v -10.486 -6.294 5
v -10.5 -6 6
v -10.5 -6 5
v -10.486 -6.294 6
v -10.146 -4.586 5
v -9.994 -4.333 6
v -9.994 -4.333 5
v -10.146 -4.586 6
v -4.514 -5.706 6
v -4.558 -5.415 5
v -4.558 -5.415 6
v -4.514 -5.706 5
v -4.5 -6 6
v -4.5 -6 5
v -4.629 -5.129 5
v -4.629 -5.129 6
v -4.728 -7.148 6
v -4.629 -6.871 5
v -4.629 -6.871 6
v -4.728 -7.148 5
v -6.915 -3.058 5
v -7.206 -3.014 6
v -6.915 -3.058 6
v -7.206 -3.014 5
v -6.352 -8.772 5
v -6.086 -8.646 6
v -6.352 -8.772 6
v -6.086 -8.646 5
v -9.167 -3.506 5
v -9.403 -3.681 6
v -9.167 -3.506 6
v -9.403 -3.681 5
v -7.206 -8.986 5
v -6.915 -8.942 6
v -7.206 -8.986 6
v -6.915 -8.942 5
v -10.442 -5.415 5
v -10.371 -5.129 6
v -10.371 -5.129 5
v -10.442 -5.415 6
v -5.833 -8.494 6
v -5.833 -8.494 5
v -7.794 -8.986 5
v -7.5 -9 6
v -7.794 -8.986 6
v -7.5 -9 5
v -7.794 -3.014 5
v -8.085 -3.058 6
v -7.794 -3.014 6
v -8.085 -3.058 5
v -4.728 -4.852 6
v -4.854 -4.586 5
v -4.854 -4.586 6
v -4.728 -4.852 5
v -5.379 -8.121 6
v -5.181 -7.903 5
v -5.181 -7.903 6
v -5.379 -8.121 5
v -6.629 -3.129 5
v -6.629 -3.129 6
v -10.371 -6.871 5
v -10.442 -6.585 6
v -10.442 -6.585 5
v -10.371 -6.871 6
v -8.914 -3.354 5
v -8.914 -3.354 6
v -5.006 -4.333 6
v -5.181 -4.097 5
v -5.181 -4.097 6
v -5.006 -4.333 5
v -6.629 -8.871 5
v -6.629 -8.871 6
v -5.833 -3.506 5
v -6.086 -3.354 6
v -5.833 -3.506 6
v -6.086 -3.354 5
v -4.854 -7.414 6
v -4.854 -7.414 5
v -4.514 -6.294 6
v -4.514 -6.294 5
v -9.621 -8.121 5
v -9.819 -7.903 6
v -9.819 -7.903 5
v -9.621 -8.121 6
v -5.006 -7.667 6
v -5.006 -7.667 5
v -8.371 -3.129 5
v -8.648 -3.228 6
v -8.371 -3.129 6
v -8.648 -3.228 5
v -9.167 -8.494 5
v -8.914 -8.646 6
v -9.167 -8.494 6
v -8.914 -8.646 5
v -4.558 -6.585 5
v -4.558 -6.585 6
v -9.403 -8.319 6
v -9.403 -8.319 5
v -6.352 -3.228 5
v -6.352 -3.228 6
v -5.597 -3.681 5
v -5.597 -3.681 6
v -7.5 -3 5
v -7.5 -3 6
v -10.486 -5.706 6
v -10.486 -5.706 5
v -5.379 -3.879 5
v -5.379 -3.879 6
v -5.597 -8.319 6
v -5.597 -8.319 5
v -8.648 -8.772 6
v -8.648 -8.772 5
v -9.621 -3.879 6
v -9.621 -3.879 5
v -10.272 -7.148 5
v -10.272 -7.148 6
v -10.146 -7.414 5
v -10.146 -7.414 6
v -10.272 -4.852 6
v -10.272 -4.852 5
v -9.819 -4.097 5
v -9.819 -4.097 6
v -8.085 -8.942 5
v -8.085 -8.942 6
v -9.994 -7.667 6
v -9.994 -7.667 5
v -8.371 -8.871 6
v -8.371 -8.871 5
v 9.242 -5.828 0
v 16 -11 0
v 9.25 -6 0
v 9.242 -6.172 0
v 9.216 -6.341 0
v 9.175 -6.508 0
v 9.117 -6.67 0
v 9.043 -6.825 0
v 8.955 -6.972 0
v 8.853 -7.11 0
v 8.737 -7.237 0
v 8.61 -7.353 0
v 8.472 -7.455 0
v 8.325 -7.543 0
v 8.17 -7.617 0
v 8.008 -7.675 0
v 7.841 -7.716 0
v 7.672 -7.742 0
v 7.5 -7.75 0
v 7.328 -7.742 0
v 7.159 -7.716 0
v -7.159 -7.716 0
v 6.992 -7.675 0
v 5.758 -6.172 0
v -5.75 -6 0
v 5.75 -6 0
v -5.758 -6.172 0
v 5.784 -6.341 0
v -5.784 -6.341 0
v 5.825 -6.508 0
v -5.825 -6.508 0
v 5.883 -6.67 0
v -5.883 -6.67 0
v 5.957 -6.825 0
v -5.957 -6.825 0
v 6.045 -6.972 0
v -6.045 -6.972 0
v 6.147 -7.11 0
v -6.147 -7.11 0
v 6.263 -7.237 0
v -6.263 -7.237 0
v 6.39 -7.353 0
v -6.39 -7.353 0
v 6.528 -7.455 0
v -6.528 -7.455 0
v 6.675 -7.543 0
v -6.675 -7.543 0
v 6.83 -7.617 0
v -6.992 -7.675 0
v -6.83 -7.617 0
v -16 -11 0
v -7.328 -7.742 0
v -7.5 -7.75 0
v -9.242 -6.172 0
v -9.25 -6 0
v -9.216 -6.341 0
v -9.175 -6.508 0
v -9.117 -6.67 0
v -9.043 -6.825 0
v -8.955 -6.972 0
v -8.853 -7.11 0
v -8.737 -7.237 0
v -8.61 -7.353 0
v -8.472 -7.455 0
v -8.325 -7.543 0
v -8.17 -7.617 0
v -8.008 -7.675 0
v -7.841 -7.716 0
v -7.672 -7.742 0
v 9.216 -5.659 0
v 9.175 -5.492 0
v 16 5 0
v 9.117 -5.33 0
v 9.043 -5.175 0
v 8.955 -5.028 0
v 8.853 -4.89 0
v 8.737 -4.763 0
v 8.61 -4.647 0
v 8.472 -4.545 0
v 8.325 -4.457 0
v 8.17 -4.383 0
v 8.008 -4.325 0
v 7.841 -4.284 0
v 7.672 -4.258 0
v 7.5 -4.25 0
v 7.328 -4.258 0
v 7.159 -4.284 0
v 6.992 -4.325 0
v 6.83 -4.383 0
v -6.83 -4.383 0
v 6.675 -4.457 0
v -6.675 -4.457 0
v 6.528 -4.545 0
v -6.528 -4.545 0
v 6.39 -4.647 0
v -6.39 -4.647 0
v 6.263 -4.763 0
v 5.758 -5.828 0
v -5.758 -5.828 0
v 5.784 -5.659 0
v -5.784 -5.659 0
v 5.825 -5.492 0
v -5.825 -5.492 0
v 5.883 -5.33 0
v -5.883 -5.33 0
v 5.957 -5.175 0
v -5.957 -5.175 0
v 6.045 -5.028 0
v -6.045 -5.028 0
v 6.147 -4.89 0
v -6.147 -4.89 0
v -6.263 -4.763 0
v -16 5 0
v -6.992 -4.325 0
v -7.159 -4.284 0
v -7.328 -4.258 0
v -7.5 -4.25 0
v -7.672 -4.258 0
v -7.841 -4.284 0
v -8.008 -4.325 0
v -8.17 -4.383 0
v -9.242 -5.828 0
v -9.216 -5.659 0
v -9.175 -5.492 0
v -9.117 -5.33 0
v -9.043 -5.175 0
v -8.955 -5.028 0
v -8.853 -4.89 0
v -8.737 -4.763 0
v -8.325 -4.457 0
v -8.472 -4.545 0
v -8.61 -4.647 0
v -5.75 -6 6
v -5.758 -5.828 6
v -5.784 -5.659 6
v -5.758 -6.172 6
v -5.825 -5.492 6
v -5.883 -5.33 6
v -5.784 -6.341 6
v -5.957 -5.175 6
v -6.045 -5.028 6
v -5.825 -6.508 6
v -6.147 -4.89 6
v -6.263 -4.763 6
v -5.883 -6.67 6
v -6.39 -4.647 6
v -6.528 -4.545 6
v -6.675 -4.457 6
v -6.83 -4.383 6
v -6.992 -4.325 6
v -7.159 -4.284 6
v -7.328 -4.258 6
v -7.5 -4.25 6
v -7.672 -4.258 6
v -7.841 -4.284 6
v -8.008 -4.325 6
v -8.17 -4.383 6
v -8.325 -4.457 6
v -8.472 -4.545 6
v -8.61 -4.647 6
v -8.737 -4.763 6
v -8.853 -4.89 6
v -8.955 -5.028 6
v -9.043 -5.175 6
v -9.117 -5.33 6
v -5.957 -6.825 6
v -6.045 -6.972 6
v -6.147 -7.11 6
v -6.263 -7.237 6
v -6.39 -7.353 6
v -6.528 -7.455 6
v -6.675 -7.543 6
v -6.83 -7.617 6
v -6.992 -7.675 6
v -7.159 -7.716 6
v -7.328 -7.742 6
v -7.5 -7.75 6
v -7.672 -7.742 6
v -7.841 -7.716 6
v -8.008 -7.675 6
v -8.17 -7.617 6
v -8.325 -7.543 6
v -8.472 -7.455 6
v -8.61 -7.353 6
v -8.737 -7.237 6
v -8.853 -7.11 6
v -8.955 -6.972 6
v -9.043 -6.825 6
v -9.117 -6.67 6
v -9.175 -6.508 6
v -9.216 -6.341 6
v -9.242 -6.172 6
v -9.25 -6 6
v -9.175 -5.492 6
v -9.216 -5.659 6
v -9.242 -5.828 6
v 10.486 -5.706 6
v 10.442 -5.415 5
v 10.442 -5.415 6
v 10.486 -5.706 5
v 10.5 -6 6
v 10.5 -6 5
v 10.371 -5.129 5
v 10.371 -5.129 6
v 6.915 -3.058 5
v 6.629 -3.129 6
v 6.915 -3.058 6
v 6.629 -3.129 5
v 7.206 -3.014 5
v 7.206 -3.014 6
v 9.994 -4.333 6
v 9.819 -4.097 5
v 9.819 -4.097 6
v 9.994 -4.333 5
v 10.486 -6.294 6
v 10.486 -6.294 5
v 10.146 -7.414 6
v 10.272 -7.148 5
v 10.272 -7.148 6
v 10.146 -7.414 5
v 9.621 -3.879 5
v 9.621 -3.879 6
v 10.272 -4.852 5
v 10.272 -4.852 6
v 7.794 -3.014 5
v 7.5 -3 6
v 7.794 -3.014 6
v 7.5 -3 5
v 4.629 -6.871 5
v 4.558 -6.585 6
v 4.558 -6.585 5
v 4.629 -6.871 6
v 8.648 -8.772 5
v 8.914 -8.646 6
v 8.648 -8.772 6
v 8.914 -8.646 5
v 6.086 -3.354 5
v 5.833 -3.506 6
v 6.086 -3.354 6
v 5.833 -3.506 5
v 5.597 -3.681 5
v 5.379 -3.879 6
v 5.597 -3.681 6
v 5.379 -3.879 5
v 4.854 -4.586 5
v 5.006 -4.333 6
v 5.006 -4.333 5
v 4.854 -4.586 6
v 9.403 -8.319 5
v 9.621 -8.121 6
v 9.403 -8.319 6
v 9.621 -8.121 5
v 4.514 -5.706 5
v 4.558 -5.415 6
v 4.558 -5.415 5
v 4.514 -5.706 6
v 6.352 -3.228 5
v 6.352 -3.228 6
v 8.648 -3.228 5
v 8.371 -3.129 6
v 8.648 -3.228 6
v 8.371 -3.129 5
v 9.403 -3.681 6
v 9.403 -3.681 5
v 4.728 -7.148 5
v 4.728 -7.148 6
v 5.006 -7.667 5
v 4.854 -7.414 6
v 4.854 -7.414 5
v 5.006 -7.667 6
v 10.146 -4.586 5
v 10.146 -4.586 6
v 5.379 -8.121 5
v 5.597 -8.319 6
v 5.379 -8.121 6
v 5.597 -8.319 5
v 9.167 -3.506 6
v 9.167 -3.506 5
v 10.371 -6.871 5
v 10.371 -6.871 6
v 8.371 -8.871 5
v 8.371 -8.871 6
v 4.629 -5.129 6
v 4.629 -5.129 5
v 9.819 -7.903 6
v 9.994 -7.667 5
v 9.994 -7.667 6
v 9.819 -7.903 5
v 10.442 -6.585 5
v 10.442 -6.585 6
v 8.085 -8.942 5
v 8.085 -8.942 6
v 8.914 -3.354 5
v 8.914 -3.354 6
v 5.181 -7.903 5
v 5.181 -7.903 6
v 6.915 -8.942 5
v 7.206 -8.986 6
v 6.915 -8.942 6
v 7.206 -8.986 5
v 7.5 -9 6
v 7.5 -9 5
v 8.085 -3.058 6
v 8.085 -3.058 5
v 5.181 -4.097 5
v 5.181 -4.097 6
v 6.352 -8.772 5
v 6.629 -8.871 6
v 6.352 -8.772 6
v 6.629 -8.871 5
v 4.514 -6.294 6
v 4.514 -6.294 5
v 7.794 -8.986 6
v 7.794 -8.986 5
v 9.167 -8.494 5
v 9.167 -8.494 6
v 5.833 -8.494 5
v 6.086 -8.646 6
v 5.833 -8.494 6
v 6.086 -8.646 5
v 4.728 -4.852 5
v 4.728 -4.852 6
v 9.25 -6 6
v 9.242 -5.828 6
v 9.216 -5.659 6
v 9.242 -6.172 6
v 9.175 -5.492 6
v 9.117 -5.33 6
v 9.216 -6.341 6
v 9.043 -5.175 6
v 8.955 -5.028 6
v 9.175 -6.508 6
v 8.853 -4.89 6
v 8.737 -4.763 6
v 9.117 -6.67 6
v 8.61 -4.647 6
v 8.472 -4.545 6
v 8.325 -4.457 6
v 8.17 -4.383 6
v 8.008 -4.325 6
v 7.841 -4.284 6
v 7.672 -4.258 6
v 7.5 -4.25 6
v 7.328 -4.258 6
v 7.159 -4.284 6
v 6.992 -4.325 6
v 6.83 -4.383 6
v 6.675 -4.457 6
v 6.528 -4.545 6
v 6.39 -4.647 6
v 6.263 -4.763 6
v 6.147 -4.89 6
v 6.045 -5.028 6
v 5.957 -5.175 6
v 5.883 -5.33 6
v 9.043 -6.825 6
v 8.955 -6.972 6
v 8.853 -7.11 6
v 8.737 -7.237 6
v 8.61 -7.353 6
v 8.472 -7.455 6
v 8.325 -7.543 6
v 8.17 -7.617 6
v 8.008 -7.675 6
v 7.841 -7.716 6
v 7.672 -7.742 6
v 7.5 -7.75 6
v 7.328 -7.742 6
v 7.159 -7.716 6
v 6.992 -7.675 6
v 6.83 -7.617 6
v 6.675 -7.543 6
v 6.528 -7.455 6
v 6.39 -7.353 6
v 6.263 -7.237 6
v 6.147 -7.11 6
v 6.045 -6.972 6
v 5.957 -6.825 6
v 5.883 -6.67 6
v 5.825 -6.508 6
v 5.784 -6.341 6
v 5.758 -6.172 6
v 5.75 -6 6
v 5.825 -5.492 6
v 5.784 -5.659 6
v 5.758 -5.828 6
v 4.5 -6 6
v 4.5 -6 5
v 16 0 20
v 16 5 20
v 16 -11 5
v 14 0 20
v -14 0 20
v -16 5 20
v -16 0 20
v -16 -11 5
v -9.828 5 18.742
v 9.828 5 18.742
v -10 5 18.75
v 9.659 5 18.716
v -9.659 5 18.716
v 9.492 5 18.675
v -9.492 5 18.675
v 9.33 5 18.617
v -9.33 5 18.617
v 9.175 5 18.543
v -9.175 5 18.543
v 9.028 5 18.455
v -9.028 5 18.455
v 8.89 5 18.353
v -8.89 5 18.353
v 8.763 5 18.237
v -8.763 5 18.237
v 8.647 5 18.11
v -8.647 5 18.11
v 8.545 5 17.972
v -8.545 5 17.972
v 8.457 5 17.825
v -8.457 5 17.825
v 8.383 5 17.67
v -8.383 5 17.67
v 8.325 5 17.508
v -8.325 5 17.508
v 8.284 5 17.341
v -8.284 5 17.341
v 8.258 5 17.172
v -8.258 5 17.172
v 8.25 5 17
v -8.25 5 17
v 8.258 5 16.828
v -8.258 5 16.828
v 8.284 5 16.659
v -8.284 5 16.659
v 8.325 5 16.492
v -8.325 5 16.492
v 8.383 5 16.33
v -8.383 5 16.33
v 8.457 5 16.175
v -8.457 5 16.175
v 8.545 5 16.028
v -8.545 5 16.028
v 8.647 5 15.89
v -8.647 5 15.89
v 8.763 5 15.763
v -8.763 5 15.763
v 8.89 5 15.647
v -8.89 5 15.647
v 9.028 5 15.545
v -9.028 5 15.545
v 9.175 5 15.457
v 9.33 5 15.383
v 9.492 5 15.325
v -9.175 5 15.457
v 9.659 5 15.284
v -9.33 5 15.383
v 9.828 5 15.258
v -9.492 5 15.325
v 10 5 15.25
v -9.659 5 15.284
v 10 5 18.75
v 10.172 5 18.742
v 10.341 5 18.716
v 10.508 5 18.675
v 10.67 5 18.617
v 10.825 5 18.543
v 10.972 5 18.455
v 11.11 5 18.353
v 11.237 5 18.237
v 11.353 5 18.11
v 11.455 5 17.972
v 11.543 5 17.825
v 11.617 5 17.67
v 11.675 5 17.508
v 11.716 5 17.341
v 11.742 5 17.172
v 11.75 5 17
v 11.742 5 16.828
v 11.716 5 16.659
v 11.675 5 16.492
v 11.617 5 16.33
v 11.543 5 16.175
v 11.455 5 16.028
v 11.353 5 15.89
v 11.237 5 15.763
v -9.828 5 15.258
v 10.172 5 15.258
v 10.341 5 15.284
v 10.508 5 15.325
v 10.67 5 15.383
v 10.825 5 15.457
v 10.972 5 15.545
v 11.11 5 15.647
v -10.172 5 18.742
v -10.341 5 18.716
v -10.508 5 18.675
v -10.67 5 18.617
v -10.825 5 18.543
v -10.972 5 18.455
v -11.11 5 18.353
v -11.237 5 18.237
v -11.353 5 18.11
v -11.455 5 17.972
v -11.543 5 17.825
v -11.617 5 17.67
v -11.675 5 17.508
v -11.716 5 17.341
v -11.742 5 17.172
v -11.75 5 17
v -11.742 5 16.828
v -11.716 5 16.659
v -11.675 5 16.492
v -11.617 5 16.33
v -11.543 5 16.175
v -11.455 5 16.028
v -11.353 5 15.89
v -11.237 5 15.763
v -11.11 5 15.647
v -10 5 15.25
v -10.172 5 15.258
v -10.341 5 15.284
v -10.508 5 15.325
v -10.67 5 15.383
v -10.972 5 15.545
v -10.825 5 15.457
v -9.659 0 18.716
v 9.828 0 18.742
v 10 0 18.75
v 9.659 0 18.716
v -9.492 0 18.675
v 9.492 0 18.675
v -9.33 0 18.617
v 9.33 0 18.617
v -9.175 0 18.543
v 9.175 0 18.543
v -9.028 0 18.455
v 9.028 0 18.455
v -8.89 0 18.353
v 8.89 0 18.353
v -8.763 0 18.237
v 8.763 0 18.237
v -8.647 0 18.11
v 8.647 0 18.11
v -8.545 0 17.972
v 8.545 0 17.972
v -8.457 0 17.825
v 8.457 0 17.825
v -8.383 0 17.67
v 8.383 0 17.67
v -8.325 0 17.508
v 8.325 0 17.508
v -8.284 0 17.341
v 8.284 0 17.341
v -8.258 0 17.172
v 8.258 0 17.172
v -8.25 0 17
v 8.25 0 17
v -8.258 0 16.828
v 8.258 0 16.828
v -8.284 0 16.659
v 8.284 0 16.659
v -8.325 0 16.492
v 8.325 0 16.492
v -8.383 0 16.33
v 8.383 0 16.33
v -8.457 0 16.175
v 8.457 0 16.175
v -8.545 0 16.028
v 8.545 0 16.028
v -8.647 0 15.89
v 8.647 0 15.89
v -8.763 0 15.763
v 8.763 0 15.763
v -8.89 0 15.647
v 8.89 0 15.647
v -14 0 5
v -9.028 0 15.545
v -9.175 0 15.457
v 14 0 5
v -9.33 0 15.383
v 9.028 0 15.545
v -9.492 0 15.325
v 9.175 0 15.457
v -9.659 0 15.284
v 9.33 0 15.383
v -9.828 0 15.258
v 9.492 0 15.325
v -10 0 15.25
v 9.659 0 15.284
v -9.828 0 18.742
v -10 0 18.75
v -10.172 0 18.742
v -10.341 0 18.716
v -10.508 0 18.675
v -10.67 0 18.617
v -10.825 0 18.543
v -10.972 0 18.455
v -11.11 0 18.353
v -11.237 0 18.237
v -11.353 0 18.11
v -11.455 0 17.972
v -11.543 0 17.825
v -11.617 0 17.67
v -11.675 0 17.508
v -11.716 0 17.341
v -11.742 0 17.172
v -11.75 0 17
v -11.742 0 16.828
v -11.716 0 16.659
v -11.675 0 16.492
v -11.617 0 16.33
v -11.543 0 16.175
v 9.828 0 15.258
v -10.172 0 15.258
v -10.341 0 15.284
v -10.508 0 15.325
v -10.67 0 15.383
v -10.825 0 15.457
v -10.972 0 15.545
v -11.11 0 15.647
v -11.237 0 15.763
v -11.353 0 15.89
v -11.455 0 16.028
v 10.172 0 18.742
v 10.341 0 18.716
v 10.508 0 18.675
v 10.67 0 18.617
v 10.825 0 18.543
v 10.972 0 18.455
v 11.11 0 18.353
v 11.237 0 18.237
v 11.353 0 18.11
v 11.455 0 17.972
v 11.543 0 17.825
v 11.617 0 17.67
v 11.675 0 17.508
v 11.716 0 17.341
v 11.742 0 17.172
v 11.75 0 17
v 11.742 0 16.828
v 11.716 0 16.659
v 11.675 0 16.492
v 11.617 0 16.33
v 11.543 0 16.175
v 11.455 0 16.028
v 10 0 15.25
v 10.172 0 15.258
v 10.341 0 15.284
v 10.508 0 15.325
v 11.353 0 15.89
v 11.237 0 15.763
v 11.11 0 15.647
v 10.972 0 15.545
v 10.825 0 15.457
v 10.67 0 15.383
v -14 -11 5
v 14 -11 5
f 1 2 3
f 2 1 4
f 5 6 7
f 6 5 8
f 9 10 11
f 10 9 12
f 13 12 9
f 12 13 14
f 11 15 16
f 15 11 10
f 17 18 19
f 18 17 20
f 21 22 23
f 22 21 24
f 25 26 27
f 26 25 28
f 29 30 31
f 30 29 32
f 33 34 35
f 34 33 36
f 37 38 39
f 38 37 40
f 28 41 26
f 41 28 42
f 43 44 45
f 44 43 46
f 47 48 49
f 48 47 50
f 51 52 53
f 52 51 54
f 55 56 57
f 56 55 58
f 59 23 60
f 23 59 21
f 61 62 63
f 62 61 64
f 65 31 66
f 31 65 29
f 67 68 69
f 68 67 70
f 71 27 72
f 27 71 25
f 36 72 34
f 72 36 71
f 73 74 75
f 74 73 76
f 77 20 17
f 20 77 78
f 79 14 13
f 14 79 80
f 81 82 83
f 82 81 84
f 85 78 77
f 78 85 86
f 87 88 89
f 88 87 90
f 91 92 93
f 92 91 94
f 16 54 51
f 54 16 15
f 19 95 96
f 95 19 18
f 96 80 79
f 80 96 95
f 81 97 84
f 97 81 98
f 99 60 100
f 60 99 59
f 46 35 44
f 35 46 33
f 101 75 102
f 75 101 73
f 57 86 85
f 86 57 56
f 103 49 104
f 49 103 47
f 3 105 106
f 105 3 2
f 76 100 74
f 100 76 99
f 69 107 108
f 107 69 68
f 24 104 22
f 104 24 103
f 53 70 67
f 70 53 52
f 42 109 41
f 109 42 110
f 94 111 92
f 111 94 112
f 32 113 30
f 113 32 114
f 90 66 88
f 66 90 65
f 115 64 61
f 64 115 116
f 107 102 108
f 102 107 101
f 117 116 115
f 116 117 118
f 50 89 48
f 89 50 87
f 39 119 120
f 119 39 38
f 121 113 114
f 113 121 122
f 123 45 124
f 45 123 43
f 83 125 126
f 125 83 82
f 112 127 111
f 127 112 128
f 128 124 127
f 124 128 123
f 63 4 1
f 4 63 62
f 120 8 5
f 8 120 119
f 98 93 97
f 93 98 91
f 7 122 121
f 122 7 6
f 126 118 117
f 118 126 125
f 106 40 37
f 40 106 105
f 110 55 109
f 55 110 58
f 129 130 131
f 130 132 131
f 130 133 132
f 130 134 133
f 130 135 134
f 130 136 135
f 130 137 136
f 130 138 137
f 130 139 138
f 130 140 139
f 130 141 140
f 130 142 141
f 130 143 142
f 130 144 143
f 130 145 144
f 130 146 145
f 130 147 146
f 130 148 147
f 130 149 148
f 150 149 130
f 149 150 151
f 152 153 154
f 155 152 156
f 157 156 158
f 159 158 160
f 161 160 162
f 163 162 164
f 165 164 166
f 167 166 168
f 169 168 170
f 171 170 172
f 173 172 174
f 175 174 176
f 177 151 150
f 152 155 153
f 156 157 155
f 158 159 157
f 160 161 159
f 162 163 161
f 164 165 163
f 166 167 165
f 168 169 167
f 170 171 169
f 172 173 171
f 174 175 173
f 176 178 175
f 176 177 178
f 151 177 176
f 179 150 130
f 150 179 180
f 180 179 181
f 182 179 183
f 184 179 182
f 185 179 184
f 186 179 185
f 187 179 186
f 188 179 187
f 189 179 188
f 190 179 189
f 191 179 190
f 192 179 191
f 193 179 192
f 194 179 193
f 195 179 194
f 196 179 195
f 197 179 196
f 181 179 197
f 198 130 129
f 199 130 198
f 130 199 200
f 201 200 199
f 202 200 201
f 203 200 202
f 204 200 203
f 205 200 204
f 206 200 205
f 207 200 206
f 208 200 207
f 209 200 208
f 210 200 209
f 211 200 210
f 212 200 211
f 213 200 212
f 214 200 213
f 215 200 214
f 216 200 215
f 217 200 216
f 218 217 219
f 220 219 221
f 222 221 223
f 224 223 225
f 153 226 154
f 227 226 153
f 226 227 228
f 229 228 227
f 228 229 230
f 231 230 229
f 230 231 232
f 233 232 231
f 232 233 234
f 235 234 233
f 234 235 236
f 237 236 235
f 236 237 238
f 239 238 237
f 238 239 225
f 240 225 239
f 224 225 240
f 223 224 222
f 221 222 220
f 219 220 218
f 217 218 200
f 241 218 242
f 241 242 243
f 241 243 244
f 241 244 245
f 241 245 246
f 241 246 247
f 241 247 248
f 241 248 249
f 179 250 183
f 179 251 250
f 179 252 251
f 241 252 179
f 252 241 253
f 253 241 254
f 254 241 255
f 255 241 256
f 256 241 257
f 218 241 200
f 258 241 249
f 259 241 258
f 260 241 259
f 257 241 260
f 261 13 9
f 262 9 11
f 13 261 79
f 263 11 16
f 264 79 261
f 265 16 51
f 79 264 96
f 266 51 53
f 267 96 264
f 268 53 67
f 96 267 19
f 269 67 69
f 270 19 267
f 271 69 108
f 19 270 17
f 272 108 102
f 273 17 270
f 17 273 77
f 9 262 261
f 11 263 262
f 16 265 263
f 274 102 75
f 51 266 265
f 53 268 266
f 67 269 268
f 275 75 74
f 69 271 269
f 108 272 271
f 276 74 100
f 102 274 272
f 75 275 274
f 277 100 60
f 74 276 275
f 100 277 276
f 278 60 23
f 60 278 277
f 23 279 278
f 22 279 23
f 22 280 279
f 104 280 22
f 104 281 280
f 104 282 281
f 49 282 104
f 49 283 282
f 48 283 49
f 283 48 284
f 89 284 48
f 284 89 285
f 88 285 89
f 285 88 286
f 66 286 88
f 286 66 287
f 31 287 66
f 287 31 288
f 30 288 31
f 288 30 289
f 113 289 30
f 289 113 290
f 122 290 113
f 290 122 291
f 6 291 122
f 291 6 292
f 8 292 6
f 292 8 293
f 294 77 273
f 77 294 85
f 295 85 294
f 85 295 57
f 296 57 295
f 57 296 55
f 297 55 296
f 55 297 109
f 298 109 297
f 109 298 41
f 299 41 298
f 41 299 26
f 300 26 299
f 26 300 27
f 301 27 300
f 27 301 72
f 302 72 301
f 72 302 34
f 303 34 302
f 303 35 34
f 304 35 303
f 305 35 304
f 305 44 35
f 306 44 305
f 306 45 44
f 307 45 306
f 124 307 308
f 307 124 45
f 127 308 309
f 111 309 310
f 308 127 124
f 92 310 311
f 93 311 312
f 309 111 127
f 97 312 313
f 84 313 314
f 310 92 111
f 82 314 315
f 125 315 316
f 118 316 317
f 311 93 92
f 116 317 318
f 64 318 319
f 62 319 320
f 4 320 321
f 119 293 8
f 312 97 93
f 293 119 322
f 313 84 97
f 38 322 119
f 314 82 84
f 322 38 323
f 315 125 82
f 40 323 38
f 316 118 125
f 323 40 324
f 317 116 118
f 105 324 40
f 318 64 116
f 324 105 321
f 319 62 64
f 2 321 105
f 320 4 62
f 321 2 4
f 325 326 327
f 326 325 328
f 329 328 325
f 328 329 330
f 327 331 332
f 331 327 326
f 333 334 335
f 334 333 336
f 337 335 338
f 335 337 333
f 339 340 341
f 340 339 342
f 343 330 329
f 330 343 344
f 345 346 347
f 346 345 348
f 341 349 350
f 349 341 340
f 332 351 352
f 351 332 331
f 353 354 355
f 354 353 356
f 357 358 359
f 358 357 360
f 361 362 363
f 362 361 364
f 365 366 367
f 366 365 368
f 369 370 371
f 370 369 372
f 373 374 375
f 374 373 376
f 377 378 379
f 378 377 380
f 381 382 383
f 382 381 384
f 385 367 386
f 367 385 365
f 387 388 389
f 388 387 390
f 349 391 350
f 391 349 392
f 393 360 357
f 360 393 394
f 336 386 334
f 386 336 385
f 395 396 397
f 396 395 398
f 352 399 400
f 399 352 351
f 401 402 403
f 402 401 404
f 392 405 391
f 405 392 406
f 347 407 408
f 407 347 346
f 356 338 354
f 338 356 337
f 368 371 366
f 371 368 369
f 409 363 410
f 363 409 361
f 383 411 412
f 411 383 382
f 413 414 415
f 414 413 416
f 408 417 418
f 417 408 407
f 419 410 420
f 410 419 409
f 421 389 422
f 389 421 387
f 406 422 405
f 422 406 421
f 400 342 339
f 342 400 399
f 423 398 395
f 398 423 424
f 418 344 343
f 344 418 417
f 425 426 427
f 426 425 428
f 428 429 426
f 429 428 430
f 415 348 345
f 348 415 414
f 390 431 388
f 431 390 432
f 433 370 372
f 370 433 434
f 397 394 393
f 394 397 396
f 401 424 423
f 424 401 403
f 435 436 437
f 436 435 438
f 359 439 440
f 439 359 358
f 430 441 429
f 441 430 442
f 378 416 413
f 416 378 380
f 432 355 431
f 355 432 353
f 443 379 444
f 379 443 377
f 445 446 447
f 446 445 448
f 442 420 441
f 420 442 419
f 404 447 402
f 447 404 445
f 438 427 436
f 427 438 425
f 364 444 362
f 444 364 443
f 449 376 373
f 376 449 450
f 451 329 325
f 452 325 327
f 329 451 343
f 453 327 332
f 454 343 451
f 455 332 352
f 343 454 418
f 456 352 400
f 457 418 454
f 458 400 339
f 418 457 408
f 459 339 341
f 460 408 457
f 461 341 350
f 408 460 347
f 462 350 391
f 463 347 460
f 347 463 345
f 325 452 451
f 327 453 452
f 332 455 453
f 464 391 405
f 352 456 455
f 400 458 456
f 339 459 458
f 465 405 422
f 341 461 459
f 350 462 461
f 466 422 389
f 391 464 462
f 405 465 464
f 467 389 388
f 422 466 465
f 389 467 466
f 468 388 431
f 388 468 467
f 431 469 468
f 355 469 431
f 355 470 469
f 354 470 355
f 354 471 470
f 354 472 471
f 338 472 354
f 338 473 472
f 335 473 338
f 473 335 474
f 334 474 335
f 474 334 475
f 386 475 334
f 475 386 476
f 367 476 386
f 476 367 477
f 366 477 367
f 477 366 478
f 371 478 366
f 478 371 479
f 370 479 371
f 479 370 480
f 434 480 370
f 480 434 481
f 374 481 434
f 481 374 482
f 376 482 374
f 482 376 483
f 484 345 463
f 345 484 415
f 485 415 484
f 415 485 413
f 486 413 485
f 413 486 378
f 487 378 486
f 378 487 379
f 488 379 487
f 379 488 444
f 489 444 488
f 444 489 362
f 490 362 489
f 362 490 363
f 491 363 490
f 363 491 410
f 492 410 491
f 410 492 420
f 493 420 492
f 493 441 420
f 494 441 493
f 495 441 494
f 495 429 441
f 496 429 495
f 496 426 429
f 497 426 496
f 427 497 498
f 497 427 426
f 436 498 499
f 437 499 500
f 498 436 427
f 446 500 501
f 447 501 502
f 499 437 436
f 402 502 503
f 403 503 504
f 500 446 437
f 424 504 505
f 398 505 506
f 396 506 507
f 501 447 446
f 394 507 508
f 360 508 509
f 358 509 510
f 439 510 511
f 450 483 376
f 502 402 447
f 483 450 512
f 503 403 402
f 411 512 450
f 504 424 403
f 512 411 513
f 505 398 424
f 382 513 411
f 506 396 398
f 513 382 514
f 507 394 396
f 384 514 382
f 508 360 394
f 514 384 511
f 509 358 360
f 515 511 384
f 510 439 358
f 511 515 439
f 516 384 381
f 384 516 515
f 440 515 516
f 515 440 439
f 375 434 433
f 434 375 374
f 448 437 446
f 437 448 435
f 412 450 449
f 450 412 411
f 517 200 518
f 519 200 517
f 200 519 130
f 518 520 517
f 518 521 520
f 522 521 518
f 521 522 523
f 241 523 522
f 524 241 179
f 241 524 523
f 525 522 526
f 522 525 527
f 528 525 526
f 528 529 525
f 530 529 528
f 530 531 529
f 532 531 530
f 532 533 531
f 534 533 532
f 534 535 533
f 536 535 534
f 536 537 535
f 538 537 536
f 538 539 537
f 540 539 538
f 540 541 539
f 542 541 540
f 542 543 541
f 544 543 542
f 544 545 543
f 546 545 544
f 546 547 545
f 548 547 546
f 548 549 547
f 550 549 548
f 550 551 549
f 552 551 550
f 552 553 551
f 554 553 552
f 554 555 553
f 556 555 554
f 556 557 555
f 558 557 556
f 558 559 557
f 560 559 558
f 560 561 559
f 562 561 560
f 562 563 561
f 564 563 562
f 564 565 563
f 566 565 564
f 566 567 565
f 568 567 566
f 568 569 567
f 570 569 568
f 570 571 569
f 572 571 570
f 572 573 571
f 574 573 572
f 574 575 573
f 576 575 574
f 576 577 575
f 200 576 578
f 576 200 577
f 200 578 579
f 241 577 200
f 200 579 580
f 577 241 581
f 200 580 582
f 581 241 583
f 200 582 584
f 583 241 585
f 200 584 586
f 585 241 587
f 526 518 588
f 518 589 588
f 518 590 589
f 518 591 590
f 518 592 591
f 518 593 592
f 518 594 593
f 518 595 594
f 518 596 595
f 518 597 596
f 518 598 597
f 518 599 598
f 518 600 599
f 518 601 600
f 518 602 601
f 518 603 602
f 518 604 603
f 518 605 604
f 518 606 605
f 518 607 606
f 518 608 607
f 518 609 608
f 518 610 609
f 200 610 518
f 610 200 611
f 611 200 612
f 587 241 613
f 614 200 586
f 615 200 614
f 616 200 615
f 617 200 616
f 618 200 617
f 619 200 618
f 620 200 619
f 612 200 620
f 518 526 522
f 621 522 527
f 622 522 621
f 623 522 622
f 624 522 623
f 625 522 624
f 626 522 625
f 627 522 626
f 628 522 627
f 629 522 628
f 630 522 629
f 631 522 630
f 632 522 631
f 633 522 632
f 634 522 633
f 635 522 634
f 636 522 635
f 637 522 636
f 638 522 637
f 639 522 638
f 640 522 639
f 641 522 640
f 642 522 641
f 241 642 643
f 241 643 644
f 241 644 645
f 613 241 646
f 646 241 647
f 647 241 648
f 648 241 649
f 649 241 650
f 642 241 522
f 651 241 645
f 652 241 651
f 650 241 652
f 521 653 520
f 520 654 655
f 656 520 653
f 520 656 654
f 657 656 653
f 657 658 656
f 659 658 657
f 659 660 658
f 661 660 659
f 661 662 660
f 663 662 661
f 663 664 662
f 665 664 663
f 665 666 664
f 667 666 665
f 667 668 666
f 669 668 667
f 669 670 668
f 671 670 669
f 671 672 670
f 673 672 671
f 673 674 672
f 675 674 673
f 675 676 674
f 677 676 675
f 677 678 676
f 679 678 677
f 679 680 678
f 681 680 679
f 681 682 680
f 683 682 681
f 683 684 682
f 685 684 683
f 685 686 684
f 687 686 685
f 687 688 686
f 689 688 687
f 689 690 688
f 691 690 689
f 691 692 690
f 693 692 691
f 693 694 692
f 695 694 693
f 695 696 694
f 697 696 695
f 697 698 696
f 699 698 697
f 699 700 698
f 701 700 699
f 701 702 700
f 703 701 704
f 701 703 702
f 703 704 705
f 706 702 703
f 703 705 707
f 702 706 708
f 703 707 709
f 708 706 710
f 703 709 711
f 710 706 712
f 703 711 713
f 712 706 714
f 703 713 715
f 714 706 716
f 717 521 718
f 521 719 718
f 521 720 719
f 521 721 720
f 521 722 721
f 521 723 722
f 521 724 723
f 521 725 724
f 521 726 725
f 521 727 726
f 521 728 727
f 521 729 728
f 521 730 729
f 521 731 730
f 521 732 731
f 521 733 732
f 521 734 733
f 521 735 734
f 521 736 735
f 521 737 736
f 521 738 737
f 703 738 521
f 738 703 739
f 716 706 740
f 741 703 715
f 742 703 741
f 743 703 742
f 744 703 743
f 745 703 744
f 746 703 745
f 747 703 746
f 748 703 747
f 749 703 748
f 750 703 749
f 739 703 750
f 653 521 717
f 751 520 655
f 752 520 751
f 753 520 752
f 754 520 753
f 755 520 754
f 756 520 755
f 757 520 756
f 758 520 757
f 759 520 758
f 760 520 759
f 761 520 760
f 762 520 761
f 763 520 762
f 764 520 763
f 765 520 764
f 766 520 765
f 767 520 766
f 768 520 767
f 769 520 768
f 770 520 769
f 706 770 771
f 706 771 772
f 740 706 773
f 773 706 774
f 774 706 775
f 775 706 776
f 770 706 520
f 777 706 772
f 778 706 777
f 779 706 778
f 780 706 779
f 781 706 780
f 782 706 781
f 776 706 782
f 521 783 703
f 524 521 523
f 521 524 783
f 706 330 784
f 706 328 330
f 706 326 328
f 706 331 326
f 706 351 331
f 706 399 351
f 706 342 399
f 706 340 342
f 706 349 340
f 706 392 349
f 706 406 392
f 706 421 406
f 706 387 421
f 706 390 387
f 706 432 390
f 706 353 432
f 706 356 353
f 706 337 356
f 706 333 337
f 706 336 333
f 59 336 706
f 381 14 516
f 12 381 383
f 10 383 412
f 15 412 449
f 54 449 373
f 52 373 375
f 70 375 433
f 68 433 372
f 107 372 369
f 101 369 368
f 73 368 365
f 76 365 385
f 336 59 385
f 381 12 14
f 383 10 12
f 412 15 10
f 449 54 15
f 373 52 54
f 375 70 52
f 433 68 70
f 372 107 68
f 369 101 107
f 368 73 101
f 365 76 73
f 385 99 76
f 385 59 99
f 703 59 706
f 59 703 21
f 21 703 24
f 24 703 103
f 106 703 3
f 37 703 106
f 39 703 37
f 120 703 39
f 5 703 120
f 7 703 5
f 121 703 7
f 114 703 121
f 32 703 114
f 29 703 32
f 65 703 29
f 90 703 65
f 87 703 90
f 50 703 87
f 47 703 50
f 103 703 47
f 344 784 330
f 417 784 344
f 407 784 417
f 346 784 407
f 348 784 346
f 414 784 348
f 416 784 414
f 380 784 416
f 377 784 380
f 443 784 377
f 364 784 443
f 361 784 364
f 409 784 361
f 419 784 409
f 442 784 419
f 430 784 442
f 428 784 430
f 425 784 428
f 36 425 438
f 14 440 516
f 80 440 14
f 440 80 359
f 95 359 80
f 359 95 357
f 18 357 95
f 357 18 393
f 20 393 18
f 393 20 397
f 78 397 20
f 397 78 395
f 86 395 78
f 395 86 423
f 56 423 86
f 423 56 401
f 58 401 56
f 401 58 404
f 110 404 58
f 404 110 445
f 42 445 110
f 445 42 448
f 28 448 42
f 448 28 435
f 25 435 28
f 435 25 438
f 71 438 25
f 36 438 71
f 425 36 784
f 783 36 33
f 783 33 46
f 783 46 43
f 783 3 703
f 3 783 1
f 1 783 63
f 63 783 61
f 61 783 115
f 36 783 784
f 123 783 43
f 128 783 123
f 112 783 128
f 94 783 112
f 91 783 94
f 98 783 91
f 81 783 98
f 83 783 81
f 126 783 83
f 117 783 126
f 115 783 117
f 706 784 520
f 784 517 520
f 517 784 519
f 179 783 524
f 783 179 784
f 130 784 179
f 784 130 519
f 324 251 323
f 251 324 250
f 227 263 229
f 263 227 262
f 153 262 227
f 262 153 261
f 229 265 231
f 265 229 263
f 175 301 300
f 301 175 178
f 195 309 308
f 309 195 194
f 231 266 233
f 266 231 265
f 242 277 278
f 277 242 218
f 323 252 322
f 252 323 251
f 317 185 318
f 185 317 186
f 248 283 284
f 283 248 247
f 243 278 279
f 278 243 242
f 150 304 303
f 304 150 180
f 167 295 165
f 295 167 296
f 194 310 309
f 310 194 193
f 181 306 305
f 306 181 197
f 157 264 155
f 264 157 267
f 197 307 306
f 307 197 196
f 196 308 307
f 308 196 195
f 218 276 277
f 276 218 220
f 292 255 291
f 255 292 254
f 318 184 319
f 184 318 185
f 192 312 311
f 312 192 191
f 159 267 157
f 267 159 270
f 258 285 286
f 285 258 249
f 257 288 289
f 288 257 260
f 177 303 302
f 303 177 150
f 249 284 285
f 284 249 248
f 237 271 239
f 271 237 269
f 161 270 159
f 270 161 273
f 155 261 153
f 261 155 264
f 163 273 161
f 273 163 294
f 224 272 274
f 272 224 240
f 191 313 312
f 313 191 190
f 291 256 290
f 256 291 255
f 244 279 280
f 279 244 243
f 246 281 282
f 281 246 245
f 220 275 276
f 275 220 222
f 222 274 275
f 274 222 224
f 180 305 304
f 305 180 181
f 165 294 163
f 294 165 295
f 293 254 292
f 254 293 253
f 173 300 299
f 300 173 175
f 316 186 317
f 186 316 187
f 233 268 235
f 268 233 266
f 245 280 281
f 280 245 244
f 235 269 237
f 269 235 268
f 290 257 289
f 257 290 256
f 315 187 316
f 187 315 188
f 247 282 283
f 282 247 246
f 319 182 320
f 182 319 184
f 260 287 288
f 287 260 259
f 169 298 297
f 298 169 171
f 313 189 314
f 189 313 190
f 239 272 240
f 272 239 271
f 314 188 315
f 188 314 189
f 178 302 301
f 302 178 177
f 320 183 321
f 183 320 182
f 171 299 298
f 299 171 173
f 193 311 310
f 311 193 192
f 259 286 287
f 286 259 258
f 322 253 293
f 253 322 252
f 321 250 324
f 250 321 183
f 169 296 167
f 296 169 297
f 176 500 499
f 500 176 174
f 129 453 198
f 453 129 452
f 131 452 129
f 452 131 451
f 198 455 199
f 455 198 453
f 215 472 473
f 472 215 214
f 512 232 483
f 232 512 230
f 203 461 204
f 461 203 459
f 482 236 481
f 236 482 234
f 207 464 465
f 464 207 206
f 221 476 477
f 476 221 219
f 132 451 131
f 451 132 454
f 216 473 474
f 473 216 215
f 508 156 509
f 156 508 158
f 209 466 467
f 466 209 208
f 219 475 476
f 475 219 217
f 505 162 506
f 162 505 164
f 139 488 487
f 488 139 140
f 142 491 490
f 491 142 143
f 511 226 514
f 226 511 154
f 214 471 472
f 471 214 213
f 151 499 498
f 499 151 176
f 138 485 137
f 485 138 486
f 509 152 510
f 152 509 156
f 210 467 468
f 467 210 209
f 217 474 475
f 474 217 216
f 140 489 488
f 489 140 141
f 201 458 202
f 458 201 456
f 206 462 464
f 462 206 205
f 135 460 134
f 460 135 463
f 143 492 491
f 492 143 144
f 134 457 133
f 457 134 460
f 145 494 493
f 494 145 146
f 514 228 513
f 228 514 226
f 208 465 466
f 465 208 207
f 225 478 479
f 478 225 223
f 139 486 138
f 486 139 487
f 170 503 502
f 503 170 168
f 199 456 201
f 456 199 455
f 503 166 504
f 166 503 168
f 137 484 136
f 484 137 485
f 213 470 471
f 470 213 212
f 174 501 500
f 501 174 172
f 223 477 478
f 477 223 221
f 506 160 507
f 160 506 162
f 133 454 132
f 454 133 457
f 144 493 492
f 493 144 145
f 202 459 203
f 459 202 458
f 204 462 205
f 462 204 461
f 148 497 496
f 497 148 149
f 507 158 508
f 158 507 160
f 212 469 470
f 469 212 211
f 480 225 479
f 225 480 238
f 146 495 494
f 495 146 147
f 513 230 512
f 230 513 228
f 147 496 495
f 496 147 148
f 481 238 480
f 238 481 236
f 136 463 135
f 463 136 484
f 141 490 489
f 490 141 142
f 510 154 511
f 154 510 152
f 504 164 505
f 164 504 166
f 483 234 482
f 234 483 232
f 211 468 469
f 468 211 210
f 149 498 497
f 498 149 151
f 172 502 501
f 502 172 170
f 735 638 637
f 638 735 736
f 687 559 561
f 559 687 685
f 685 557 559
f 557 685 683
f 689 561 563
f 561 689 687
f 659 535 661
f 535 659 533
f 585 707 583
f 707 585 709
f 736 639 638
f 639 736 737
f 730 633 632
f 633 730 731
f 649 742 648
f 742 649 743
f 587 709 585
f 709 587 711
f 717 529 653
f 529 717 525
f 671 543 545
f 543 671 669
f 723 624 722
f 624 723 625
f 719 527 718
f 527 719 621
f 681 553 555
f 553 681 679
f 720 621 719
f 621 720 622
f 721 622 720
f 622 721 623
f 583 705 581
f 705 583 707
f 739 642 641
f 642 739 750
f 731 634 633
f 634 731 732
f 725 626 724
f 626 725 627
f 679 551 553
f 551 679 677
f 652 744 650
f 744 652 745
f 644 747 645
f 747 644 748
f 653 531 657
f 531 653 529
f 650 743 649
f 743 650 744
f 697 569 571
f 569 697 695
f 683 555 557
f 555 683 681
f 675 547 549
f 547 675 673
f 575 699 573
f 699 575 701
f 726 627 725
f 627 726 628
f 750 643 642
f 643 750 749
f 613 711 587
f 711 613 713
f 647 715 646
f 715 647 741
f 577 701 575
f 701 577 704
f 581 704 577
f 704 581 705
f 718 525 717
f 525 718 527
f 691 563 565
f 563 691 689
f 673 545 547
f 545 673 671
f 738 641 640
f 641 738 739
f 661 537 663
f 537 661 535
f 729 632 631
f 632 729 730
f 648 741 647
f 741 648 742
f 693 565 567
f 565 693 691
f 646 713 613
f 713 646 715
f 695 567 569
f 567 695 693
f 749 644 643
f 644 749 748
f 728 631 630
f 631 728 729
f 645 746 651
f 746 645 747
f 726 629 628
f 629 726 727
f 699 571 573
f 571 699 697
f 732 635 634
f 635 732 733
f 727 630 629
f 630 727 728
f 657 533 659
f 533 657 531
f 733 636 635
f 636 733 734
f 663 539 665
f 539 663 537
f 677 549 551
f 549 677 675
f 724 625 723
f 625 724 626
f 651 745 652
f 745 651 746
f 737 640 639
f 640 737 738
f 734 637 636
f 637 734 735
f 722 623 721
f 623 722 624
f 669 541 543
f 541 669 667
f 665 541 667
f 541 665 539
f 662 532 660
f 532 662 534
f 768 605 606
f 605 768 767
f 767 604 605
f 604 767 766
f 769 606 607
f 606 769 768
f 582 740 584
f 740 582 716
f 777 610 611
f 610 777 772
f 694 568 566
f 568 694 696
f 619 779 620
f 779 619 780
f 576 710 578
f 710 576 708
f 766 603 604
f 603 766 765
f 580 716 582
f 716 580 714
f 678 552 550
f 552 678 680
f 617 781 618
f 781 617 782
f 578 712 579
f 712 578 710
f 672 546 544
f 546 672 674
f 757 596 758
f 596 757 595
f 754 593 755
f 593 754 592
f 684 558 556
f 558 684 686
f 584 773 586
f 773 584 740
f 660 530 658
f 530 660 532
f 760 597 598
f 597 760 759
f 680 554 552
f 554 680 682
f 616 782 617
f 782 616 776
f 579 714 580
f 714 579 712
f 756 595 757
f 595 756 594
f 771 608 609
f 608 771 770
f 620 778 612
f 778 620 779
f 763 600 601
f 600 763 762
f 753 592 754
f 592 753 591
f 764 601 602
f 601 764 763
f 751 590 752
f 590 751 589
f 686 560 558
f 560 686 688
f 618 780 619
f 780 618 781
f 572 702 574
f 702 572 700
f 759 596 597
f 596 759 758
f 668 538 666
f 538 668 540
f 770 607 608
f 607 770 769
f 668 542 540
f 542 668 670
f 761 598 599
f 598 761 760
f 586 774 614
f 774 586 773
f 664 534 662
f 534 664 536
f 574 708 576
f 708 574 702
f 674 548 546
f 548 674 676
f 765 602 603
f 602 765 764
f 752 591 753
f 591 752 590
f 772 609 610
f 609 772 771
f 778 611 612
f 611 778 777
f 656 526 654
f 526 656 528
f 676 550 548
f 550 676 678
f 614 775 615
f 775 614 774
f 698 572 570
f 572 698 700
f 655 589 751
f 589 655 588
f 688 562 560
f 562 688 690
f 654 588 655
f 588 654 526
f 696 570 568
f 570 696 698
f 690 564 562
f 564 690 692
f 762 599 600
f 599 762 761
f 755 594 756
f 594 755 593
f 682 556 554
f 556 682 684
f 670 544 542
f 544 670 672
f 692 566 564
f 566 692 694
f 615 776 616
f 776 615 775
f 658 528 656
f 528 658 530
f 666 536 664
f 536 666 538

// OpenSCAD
$fn=64;
difference() {
   union() {
      translate([-16,0,0]) cube([32,5,20],false);
      translate([-16,0,0]) rotate([180,-90,0]) linear_extrude(2) polygon([[5,11],[5,0],[20,0]]);
      translate([14,0,0]) rotate([180,-90,0]) linear_extrude(2) polygon([[5,11],[5,0],[20,0]]);
      translate([-16,-11,0]) cube([32,11,5],false);
      for(x=[-7.5,7.5]) { translate([x,-6,0]) cylinder(d=6,h=6,center=false); }
   }
   for(x=[-7.5,7.5]) { translate([x,-6,-1]) cylinder(d=3.5,h=10,center=false); }
   for(x=[-10,10]) { translate([x,-1,17]) rotate([-90,0,0]) cylinder(d=3.5,h=10,center=false); }
}
